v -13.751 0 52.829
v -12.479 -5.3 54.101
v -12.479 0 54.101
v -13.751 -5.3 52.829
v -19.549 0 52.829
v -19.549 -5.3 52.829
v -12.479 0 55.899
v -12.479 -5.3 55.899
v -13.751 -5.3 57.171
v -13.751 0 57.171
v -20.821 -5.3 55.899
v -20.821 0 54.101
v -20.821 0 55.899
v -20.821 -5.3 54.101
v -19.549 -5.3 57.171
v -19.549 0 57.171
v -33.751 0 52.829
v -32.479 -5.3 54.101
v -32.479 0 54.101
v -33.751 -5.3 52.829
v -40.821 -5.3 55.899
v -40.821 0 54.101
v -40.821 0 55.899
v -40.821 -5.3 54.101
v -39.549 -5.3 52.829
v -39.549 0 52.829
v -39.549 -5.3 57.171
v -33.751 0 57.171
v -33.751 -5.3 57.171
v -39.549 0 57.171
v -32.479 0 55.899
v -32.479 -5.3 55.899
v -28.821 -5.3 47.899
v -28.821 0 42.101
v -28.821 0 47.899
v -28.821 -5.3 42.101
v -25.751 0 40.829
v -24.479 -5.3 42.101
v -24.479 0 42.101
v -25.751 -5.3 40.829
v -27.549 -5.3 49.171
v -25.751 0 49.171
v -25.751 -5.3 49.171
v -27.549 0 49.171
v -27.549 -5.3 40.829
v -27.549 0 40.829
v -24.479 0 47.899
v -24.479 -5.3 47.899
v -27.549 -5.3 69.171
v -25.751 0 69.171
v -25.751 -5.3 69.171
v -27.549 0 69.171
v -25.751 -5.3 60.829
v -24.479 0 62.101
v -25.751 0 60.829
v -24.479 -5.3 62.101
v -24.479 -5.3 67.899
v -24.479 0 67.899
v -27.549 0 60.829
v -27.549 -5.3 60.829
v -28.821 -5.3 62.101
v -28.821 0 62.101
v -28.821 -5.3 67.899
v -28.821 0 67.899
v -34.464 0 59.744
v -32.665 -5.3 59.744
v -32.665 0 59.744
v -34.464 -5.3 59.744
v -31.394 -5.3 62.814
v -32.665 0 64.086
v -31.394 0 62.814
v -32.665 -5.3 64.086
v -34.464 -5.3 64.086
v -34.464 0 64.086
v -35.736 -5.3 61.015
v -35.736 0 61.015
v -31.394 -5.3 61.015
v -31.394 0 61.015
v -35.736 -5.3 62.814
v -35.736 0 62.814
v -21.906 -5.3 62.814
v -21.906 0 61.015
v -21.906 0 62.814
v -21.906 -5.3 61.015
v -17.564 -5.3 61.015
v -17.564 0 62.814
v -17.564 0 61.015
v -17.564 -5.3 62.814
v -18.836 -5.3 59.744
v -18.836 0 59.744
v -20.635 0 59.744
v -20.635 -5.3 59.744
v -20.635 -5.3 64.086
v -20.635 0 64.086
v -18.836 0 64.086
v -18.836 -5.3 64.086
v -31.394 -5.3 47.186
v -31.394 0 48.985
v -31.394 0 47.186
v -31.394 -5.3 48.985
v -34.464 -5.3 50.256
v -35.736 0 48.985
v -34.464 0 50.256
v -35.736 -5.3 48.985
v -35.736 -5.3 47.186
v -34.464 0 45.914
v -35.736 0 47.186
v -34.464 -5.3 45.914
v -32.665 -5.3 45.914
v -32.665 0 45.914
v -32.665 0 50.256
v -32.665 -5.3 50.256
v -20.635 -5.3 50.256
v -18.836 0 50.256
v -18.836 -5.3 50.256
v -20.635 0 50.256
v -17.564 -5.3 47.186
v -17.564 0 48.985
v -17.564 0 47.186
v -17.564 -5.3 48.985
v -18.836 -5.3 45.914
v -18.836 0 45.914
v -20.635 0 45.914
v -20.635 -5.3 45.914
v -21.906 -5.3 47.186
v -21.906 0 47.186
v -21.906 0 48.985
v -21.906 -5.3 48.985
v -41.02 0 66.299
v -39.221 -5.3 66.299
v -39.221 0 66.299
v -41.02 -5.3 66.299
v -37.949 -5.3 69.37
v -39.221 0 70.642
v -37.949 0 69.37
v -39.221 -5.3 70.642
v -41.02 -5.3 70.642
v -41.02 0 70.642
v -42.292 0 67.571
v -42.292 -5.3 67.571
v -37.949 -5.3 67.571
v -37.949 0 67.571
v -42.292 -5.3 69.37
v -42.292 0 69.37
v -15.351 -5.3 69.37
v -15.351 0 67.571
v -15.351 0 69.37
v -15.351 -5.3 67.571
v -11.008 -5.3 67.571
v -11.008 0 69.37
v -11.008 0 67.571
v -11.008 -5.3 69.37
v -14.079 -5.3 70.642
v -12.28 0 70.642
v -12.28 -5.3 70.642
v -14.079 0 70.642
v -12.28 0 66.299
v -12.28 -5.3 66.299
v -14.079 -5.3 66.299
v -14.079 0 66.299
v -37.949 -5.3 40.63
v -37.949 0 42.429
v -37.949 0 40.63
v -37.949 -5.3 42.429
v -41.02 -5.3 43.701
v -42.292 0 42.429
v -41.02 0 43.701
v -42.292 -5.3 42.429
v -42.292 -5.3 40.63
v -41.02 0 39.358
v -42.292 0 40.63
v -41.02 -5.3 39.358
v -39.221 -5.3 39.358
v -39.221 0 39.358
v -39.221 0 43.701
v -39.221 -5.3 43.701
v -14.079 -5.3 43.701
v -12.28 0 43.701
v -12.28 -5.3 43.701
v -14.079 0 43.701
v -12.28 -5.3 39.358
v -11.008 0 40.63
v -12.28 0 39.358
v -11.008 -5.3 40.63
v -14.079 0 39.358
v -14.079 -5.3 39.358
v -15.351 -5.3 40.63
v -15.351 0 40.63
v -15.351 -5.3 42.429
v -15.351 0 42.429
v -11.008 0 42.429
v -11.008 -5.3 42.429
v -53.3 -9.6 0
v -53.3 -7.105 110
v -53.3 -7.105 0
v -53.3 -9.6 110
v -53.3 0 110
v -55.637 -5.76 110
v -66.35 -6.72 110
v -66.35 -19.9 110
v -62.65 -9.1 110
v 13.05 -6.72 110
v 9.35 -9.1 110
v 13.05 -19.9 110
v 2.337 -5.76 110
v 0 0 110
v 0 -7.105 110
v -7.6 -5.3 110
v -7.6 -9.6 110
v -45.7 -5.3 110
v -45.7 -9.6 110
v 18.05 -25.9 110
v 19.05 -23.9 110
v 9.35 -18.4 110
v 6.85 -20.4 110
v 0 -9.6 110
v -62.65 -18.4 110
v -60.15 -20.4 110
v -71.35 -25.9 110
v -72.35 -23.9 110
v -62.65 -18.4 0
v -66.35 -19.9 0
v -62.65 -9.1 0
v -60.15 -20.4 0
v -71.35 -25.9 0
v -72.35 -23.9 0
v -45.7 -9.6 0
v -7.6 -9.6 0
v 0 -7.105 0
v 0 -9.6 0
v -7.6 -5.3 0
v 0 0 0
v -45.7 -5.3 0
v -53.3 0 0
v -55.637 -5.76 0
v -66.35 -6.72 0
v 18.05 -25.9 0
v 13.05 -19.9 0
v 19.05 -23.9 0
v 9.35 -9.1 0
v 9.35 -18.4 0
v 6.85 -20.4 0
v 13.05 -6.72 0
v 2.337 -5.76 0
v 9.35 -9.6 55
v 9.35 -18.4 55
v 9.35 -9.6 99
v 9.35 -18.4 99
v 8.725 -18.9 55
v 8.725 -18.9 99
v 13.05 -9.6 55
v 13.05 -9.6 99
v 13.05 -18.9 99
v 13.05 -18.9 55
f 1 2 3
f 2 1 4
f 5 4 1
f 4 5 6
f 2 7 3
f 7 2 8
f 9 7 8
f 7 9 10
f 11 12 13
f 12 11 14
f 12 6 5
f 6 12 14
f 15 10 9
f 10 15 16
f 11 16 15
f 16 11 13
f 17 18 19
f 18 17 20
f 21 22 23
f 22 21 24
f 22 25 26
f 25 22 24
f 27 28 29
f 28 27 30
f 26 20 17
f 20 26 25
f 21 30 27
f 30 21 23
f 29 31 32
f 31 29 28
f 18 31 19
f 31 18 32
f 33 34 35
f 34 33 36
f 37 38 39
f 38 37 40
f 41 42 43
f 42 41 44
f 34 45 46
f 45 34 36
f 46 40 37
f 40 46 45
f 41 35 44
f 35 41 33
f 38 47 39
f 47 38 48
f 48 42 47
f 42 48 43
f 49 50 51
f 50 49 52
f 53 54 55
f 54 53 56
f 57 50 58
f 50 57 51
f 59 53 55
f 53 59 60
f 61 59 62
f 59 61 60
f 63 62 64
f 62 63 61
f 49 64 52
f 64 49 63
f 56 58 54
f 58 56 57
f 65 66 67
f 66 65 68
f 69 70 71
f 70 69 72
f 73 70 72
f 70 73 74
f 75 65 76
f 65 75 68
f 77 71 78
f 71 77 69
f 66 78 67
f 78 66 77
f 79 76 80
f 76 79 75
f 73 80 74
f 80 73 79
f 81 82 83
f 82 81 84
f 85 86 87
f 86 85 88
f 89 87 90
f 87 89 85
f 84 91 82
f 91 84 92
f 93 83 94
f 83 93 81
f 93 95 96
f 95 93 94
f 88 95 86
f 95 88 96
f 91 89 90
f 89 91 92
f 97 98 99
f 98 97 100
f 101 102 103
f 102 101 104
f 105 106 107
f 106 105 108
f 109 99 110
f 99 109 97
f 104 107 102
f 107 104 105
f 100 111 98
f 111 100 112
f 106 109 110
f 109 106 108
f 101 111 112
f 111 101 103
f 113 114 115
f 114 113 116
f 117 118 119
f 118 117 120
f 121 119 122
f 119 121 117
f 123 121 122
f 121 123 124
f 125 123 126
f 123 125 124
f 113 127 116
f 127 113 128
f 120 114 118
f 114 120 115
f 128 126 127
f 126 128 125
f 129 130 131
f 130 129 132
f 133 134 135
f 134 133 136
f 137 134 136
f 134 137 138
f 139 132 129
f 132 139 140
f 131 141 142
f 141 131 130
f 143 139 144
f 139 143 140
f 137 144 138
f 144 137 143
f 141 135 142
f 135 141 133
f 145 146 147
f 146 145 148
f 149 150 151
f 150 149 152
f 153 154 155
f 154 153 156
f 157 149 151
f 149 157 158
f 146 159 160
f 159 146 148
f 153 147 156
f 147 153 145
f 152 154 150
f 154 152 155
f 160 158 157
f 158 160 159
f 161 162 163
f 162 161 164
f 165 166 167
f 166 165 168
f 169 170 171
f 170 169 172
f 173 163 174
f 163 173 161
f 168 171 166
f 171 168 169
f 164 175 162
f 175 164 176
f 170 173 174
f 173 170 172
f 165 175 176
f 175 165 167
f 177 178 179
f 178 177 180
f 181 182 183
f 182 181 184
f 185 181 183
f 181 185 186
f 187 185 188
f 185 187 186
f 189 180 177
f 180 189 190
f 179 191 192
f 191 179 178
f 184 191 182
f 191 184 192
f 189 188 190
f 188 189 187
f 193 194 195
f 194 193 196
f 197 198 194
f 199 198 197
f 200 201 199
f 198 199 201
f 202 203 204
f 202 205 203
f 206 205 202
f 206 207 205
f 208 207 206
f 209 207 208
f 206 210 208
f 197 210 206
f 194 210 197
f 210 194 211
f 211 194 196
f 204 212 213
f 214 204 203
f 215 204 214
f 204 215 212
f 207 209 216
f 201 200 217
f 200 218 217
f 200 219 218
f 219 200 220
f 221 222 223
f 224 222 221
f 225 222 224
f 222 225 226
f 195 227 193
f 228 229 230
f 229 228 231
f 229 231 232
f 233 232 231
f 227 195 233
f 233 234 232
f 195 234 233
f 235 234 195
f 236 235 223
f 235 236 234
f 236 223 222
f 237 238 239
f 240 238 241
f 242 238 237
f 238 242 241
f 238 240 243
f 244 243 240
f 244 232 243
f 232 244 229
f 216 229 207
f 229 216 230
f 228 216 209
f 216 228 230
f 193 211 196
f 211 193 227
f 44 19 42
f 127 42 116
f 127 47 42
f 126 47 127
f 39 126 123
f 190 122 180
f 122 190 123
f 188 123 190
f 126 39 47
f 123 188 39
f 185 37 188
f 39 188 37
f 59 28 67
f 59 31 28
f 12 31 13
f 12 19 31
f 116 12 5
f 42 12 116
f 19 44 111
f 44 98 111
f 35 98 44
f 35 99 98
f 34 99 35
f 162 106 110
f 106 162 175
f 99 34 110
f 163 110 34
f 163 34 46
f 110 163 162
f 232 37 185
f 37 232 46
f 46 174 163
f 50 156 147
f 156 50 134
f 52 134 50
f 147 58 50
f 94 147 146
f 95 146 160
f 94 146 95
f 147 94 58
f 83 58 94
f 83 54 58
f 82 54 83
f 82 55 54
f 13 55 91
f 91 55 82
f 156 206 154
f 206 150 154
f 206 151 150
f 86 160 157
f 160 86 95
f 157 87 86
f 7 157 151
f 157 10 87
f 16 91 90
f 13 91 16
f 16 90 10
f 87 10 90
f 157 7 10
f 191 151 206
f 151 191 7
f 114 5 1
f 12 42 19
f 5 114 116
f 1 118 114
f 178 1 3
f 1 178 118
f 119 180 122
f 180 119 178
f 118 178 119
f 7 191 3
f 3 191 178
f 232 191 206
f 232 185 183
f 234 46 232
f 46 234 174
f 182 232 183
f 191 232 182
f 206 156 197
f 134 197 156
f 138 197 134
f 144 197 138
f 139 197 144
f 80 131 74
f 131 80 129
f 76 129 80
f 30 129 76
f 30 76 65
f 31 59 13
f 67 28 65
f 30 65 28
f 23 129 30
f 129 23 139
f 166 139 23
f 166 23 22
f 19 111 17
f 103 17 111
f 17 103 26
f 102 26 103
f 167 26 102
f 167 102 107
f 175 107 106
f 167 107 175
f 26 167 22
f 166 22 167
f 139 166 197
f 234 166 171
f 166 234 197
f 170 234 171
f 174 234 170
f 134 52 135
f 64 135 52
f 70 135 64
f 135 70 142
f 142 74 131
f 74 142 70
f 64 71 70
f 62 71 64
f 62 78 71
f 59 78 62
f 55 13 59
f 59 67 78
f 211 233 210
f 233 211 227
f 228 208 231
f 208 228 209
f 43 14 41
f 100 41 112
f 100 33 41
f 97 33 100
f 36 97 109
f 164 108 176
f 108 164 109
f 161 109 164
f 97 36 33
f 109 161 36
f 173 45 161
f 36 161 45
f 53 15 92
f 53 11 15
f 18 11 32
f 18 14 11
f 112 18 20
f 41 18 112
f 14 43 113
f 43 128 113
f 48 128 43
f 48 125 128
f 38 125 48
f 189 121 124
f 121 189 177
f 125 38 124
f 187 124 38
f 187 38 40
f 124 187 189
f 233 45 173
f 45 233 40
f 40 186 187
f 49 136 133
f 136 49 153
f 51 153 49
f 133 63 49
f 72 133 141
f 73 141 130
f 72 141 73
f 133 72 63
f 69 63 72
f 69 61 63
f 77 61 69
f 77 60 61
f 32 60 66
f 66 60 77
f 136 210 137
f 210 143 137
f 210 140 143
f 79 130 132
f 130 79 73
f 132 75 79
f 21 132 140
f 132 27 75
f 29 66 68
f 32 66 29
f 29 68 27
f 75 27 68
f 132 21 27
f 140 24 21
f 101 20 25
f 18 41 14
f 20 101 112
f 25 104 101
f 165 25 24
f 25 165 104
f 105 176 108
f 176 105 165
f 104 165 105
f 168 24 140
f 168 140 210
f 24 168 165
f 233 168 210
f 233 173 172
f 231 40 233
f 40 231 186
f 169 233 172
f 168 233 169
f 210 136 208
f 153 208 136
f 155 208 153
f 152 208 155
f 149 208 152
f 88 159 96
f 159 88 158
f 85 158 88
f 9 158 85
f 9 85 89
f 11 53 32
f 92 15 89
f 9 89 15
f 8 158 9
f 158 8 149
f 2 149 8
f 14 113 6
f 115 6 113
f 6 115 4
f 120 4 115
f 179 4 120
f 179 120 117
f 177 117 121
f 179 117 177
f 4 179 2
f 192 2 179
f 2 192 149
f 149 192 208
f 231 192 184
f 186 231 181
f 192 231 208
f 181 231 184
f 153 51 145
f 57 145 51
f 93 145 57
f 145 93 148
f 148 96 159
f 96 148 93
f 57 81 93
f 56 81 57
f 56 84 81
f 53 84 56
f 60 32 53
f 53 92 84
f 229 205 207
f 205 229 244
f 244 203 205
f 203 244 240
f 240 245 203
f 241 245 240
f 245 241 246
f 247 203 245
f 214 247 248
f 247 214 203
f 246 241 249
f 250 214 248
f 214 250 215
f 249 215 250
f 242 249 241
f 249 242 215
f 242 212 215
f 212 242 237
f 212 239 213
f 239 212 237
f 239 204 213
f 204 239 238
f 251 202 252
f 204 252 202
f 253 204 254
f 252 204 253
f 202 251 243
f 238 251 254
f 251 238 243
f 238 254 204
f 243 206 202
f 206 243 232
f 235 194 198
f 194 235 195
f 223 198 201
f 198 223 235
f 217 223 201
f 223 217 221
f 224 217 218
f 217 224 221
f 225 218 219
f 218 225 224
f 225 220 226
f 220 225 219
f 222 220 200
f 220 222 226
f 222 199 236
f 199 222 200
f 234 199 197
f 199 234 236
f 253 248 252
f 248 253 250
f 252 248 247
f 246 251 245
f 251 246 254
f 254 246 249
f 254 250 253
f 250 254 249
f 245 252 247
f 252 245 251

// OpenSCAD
// in mm.  ZTE Speed is 66, Moto E4 is 72
phone_width = 72; // [54:0.5:100]

// in mm.  ZTE Speed is 10.2, Moto E4 is 9.3
phone_thickness = 9.3; //[5:0.1:20]

// in mm.  
clip_thickness=110; //[50:1:200]

// extended actobotics hole pattern?
actHoles="false"; //[true,false]

// extended goBILDA hole pattern?
gbHoles="false"; //[true,false]

// extended tetrix hole pattern?
tetHoles="false"; //[true,false]

// gap in top right?
gaptr="true"; //[true,false]

// gap in top left?
gaptl="false"; //[true,false]

// gap in bottom right?
gapbr="false"; //[true,false]

// gap in bottom left?
gapbl="false"; //[true,false]



/* [Hidden] */
ht=3.2;
cWid=3.7; // mm. width of clips

// preview[view:south, tilt:top]

i2m = 25.4; // inches to mm

// base with slots
bLen=53.3;
bWid=9.6;

/* [Hidden] */
i2m=25.4; // inches to mm
rHole=2.35; //mm
base_length=bLen; //[1.5:0.25:4.5]

rotate(180)
wholeClip();


//if (two_clips=="true") {
//translate([0,-3,0])
//mirror([0,1,0])
//wholeClip();
//}

module wholeClip() {
    
difference() {  // remove side gaps
    
union() { // base plus clips
    
difference() { // base w/ holes
    
    cube([bLen, bWid, clip_thickness]);
    
    translate([(bLen-1.5*25.4)/2, bWid-4.3, -1])
    cube([1.5*25.4, 4.3+0.01, clip_thickness+2]);
    
 //   if (clip_thickness>3.2) {
 //   translate([bLen/2-(22)/2, 0,ht])
 //   cube([22, bWid+2, clip_thickness]);
 //  }
    

    translate([bLen/2,20,clip_thickness/2])
    rotate(v=[1,0,0], a=90) {
        
       
    gobildaTetrixHoles();
if (gbHoles=="true") { 
    translate([0,24,0])
    gobildaHoles();
    
    translate([0,-24,0])
    gobildaHoles();
    
    translate([0,36,0])
    gobildaHoles();
    
    translate([0,-36,0])
    gobildaHoles();
}

if (tetHoles=="true") { 
    translate([0,32,0])
    tetrixHoles();
    
    translate([0,-32,0])
    tetrixHoles();
}

if (actHoles=="true") {    
    translate([0,1.5*25.4,0])
    actoboticsHoles();
    
    translate([0,-1.5*25.4,0])
    actoboticsHoles();
}

    
   
    actoboticsHoles();
if (actHoles=="true") {
}

}
 /*   translate([bLen/2-(13.3+0.3)/2, 2.3, -2])
    cube([13.3+0.3, ht+0.3, 10]);
    
    translate([bLen/2-1.5/2*i2m, 2.3, -2])
    cube([5,ht+0.3, 10]);
    
    translate([bLen/2+1.5/2*i2m -5, 2.3, -2])
    cube([5,ht+0.3, 10]);*/
}

clip();

translate([bLen,0,0])
mirror([1,0,0])
clip();
}

if (gaptl=="true") {
    translate([bLen,bWid+0.0001,clip_thickness*.5])
    cube([2*bLen, phone_thickness, clip_thickness*0.40]);
}

if (gaptr=="true") {
    translate([-bLen,bWid+0.0001,clip_thickness*.5])
    cube([2*bLen, phone_thickness, clip_thickness*0.40]);
}

if (gapbl=="true") {
    translate([bLen,bWid+0.0001,clip_thickness*.1])
    cube([2*bLen, phone_thickness, clip_thickness*0.400001]);
}

if (gapbr=="true") {
    translate([-bLen,bWid+0.0001,clip_thickness*.1])
    cube([2*bLen, phone_thickness, clip_thickness*0.400001]);
}

}

module clip() {
linear_extrude(height=clip_thickness)
polygon([
[0,0],
[bLen/2 - phone_width/2-cWid, bWid*0.7],
[bLen/2 - phone_width/2-cWid, bWid+phone_thickness+1],
[bLen/2 - phone_width/2-6-cWid, bWid+phone_thickness+5],
[bLen/2 - phone_width/2-5-cWid, bWid+phone_thickness+7],
[bLen/2 - phone_width/2 +2.5, bWid+phone_thickness+1.5],
[bLen/2 - phone_width/2 , bWid+phone_thickness-0.5],
[bLen/2 - phone_width/2 , bWid-0.5],
[(bLen/2 - phone_width/2)/4 , bWid*0.6],
[1,bWid*0.8]]);
}

module gobildaTetrixHoles() {
        // gobilda+tetrix holes
    hull() {
    
    translate([0 - 8, 0, -2])
            rotate(180/8)
    cylinder(h=100, r=rHole, $fn=8);
            translate([0 - 12, 0, -2])
            rotate(180/8)
    cylinder(h=100, r=rHole, $fn=8);
    }
    
    hull() {
    translate([0 + 8, 0, -2])
            rotate(180/8)
    cylinder(h=100, r=rHole, $fn=8);
        
    translate([0 + 12, 0, -2])
            rotate(180/8)
    cylinder(h=100, r=rHole, $fn=8);
    }
    
    hull() {
    translate([0 , 0 -8, -2])
            rotate(180/8)
    cylinder(h=100, r=rHole, $fn=8);
        
    translate([0 , 0 -12, -2])
            rotate(180/8)
    cylinder(h=100, r=rHole, $fn=8);
    }
    
    hull() {
    translate([0, 0 +8, -2])
            rotate(180/8)
    cylinder(h=100, r=rHole, $fn=8);
        
    translate([0, 0 +12, -2])
            rotate(180/8)
    cylinder(h=100, r=rHole, $fn=8);
    }
}

module gobildaHoles() {

    translate([0 - 12, 0, -2])
            rotate(180/8)
    cylinder(h=100, r=rHole, $fn=8);

        
    translate([0 + 12, 0, -2])
            rotate(180/8)
    cylinder(h=100, r=rHole, $fn=8);

        
    translate([0 , 0 -12, -2])
            rotate(180/8)
    cylinder(h=100, r=rHole, $fn=8);

        
    translate([0, 0 +12, -2])
            rotate(180/8)
    cylinder(h=100, r=rHole, $fn=8);
}

module tetrixHoles() {

    translate([0 - 8, 0, -2])
            rotate(180/8)
    cylinder(h=100, r=rHole, $fn=8);

        
    translate([0 + 8, 0, -2])
            rotate(180/8)
    cylinder(h=100, r=rHole, $fn=8);

        
    translate([0 , 0 -8, -2])
            rotate(180/8)
    cylinder(h=100, r=rHole, $fn=8);

        
    translate([0, 0 +8, -2])
            rotate(180/8)
    cylinder(h=100, r=rHole, $fn=8);
}

module actoboticsHoles() {
        // actobotics inner holes
    translate([0, 0, -2])
    rotate(45)
    translate([0.77/2*i2m, 0, -2])
            rotate(180/8)
    cylinder(h=100, r=rHole, $fn=8);
    
    translate([0, 0, -2])
    rotate(135)
    translate([0.77/2*i2m, 0, -2])
            rotate(180/8)
    cylinder(h=100, r=rHole, $fn=8);
    
    translate([0, 0, -2])
    rotate(-45)
    translate([0.77/2*i2m, 0, -2])
        rotate(180/8)
    cylinder(h=100, r=rHole, $fn=8);
    
    translate([0, 0, -2])
    rotate(-135)
    translate([0.77/2*i2m, 0, -2])
        rotate(180/8)
    cylinder(h=100, r=rHole, $fn=8);
    
    // actobotics outer holes
    translate([0, 0, -2])
    rotate(45)
    translate([0.75*i2m, 0, -2])
        rotate(180/8)
    cylinder(h=100, r=rHole, $fn=8);
    
    translate([0, 0, -2])
    rotate(135)
    translate([0.75*i2m, 0, -2])
        rotate(180/8)
    cylinder(h=100, r=rHole, $fn=8);
    
    translate([0, 0, -2])
    rotate(-45)
    translate([0.75*i2m, 0, -2])
        rotate(180/8)
    cylinder(h=100, r=rHole, $fn=8);
    
    translate([0, 0, -2])
    rotate(-135)
    translate([0.75*i2m, 0, -2])
    rotate(180/8)
    cylinder(h=100, r=rHole, $fn=8);
}
}
